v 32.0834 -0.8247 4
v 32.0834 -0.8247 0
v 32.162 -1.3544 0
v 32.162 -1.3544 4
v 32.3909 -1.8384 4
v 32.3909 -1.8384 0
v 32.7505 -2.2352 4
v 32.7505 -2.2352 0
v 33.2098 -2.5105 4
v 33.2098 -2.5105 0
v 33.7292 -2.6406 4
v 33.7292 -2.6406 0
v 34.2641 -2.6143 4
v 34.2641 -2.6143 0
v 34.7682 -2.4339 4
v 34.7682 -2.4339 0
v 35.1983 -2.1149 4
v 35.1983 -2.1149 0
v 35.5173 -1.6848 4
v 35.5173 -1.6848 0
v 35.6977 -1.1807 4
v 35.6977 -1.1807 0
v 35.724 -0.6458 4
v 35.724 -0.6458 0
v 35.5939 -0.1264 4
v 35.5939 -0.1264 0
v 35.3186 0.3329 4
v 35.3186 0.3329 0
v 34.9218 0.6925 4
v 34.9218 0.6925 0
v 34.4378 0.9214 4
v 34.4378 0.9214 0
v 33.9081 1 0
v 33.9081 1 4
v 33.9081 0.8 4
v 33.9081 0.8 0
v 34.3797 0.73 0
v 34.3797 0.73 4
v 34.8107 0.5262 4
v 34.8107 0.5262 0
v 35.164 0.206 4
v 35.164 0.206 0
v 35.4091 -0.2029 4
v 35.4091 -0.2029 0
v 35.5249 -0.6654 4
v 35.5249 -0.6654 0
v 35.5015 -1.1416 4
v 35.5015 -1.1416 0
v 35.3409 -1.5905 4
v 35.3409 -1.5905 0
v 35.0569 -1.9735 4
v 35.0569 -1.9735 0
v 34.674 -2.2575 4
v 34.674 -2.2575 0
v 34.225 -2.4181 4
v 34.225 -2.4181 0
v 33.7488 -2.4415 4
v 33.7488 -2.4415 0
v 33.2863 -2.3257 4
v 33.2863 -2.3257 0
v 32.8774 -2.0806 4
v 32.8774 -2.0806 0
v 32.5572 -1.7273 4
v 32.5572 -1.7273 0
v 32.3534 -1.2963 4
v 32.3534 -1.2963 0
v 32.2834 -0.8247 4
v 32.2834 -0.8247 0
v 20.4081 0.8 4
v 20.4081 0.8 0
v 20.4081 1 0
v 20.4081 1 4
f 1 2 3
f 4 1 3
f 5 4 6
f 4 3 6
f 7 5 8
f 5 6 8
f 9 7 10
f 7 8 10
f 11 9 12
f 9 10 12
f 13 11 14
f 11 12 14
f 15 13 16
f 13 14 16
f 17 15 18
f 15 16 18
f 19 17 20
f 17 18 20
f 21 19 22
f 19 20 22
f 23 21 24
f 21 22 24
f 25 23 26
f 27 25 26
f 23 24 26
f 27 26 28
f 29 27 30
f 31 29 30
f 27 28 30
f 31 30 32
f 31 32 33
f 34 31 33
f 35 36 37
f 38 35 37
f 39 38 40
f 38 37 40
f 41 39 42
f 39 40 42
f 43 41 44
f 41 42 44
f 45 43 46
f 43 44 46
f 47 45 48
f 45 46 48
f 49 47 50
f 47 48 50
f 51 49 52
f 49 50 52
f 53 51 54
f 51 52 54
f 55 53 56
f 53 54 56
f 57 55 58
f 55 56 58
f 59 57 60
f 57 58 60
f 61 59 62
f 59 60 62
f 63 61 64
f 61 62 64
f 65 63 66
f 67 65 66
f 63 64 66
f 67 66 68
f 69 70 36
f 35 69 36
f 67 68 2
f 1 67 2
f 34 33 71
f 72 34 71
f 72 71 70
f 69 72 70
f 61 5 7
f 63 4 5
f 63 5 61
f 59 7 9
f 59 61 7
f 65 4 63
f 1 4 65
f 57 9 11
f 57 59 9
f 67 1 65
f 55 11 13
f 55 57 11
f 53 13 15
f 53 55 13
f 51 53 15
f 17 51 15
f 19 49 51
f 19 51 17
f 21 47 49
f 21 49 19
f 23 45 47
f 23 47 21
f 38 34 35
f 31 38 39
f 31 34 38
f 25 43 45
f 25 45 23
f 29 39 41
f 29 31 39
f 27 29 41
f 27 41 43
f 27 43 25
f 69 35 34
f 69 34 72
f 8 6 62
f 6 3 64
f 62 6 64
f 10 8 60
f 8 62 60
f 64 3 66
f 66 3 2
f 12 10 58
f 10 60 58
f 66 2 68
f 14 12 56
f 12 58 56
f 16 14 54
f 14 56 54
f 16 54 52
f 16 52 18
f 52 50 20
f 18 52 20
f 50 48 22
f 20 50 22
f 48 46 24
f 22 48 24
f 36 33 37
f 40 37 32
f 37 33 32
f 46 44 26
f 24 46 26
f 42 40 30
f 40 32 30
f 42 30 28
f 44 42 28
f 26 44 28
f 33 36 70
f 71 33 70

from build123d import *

# Parameters (mm, degrees)
RESSALTO_EXTRUS_O1_DEPTH = 4


with BuildPart() as part:
    # Esboço1 → Ressalto-extrusão1 (new body)
    with BuildSketch(Plane.XY):
        with BuildLine():
            Line((20.408082875, 0.8), (33.077498183, 0.8))
            Line((33.077498183, 0.8), (33.908082875, 0.8))
            ThreePointArc((33.908082875, 0.8), (35.05690323, -1.973497683), (32.283405548, -0.824677327))
            Line((32.283405548, -0.824677327), (32.083405548, -0.824677327))
            ThreePointArc((32.083405548, -0.824677327), (35.198324587, -2.114919039), (33.908082875, 1))
            Line((33.908082875, 1), (20.408082875, 1))
            Line((20.408082875, 1), (20.408082875, 0.8))
        make_face()
    extrude(amount=RESSALTO_EXTRUS_O1_DEPTH)


solid = part.part
